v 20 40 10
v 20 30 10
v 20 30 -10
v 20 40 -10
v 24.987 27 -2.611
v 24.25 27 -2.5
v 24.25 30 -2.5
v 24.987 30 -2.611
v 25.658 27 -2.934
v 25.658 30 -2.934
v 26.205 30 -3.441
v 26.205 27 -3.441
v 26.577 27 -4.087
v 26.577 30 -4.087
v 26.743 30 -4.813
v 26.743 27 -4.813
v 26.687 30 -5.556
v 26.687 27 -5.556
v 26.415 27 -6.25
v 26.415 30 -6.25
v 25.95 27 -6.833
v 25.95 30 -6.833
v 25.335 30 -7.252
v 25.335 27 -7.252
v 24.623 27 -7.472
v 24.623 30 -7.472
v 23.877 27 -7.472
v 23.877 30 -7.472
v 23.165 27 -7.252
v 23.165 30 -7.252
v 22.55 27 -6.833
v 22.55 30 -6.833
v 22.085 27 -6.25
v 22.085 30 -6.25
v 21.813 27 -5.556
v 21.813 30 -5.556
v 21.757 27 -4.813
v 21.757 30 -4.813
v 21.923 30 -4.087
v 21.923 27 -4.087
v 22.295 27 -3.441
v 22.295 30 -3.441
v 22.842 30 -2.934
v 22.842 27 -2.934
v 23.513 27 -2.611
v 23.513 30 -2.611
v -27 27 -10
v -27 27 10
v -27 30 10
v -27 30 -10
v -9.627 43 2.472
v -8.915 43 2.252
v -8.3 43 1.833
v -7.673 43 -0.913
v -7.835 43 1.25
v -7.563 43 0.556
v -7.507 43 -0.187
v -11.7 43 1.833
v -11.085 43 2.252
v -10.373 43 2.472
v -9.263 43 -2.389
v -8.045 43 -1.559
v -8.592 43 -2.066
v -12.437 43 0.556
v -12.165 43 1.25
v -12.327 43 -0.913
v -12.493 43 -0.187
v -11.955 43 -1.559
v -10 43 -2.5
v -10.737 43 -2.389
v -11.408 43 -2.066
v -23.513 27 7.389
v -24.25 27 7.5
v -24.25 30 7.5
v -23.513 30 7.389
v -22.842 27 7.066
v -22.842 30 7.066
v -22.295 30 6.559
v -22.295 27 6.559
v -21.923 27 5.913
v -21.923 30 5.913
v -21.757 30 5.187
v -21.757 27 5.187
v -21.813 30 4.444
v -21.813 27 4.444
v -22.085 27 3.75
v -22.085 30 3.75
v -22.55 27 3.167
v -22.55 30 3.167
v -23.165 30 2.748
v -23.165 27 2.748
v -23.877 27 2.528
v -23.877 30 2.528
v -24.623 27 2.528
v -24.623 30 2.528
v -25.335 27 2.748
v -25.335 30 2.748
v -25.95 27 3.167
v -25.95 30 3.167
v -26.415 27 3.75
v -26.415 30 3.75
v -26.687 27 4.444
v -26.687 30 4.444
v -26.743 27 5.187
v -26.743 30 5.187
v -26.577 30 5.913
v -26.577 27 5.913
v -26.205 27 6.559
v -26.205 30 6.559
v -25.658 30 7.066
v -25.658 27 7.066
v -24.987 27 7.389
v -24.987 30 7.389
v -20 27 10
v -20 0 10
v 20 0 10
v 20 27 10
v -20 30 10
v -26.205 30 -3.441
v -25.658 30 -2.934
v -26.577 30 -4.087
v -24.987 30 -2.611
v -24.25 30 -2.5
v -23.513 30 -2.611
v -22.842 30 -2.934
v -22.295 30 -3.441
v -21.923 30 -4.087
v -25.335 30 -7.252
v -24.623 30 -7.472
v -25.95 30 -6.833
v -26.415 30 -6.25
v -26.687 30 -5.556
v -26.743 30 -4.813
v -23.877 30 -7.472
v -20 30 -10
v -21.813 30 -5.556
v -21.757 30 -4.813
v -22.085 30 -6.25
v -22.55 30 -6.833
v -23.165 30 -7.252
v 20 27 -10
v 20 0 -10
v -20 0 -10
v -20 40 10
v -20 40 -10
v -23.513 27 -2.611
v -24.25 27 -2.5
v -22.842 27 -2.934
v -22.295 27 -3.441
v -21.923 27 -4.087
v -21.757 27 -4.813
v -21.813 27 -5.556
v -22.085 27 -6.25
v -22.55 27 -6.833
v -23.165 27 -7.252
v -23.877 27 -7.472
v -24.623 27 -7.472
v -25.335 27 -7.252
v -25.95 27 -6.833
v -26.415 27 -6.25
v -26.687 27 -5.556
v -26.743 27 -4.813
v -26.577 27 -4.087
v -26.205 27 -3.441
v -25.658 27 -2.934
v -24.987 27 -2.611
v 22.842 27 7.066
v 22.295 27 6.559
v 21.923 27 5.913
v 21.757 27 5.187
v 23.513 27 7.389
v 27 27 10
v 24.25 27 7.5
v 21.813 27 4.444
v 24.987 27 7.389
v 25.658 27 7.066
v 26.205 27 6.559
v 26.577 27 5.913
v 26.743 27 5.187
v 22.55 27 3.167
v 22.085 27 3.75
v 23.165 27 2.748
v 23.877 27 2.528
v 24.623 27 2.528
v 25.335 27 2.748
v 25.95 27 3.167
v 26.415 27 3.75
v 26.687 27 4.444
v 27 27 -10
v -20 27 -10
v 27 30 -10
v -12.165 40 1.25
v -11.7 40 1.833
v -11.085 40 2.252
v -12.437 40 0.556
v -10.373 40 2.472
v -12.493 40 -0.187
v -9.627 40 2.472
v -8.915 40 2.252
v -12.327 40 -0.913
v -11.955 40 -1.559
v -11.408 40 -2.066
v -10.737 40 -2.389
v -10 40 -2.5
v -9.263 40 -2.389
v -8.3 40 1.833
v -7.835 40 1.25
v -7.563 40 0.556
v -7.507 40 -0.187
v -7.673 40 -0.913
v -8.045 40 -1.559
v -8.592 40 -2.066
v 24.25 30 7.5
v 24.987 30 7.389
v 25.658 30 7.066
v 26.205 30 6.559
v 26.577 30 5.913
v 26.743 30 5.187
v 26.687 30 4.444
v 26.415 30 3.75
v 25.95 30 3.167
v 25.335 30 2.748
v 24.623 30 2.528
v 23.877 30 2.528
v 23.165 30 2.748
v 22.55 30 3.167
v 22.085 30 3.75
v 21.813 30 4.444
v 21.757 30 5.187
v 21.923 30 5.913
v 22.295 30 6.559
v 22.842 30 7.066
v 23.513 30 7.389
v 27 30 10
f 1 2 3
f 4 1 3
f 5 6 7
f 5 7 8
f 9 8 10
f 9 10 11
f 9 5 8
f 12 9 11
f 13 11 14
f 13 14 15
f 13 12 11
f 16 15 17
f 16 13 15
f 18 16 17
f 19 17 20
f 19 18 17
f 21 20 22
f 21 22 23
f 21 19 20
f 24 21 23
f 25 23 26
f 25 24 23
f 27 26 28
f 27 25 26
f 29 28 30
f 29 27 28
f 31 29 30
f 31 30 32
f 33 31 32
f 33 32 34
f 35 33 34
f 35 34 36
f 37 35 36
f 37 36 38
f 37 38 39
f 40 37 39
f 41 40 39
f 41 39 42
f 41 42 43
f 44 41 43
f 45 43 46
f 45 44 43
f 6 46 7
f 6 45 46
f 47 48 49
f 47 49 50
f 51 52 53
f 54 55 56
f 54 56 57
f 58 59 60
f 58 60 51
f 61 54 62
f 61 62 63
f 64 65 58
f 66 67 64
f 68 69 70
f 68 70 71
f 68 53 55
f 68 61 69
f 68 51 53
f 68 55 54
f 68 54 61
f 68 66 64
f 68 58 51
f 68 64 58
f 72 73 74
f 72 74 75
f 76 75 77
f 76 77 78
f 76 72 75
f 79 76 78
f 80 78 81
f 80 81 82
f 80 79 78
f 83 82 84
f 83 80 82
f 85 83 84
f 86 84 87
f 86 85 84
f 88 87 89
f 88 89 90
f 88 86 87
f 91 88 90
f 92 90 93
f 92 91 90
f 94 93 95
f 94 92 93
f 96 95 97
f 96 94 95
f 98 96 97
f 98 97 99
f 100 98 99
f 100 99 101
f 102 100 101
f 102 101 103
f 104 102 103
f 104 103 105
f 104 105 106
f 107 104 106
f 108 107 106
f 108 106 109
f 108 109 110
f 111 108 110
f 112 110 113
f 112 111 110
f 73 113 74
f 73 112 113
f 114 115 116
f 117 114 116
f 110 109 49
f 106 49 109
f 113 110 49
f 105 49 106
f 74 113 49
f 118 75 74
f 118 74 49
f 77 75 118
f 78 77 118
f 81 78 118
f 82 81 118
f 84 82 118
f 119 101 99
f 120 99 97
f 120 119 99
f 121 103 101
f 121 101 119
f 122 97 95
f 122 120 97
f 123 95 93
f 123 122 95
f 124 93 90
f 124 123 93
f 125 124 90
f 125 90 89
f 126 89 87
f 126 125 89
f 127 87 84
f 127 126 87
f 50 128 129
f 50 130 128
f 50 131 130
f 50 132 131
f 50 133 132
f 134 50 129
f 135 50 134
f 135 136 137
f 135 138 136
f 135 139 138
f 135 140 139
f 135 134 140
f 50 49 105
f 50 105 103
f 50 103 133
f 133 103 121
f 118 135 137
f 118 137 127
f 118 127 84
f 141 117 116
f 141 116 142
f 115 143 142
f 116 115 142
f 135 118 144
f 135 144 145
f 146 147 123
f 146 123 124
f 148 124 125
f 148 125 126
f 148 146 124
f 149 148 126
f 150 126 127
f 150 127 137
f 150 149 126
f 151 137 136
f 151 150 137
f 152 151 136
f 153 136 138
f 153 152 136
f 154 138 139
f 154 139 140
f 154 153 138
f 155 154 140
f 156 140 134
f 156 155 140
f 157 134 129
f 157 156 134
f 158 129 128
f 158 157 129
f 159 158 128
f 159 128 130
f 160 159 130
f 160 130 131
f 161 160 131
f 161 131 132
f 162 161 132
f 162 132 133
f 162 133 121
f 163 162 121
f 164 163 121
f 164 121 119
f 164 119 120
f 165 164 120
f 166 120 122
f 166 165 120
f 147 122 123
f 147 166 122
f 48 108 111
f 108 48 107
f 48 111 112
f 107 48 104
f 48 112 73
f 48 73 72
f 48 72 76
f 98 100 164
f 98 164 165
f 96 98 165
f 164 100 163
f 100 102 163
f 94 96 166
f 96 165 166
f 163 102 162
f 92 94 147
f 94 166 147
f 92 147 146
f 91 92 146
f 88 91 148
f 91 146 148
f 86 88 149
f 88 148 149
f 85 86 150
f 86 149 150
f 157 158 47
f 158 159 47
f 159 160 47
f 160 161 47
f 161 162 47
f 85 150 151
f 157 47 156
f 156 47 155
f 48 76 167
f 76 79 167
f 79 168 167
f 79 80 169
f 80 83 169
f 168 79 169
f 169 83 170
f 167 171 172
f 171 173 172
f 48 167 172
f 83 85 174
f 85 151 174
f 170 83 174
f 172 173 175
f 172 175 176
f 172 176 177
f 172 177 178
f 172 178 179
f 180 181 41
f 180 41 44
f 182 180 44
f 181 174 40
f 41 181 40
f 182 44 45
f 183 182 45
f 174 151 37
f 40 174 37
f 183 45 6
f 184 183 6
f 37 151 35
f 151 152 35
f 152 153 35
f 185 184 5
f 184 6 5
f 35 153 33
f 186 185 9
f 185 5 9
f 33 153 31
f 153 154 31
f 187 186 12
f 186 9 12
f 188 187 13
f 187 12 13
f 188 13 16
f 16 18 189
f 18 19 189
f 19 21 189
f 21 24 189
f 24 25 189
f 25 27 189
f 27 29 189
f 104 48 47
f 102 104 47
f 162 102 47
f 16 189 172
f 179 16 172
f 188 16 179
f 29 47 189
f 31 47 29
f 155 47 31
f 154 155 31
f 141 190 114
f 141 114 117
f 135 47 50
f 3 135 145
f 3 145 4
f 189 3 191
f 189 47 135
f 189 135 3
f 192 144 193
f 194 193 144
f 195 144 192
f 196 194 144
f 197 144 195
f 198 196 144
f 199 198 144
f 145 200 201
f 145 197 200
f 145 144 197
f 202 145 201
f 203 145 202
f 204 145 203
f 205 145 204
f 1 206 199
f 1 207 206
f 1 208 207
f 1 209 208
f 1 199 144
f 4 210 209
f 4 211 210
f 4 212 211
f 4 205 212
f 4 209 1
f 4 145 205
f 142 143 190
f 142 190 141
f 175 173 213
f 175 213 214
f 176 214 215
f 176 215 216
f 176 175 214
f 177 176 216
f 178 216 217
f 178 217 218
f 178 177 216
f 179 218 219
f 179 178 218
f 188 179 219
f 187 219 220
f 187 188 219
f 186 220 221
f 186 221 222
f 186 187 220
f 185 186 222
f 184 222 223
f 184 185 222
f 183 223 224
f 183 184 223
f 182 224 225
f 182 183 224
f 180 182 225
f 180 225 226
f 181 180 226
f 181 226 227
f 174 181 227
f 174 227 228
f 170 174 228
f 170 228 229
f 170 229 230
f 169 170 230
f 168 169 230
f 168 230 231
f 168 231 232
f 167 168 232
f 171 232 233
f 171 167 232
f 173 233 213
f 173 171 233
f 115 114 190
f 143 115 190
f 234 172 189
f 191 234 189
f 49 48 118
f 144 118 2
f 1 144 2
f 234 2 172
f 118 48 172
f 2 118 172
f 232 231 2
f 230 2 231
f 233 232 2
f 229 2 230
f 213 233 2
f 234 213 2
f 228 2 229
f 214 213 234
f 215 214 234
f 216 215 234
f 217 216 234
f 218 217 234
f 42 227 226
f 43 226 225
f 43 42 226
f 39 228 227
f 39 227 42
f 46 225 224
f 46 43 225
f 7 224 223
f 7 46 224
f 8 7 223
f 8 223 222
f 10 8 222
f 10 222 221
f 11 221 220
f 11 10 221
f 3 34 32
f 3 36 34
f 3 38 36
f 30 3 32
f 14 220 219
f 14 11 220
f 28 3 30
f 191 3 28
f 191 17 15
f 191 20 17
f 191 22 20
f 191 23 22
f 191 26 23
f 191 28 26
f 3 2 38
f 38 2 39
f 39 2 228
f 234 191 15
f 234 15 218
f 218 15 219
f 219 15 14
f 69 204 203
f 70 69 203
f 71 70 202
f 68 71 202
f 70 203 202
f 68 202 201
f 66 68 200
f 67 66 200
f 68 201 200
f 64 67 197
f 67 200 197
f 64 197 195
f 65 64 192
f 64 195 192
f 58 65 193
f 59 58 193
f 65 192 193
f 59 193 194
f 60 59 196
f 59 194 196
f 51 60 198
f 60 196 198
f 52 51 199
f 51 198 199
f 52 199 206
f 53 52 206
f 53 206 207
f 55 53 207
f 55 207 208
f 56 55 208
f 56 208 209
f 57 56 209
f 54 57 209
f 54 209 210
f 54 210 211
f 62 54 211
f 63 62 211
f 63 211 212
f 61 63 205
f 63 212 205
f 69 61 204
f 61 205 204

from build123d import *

# Parameters (mm, degrees)
SKETCH1_W           = 40
SKETCH1_H           = 20
BOSS_EXTRUDE1_DEPTH = 27
SKETCH2_W           = 54
SKETCH2_H           = 20
SKETCH2_R           = 2.5
BOSS_EXTRUDE4_DEPTH = 3
SKETCH3_W           = 40
SKETCH3_H           = 20
BOSS_EXTRUDE5_DEPTH = 10
SKETCH5_R           = 2.5
BOSS_EXTRUDE6_DEPTH = 3


with BuildPart() as part:
    # Sketch1 → Boss-Extrude1 (new body)
    with BuildSketch(Plane(origin=(0, 0, 0), x_dir=(1, 0, 0), z_dir=(0, 1, 0))):
        Rectangle(SKETCH1_W, SKETCH1_H)
    extrude(amount=BOSS_EXTRUDE1_DEPTH)


with BuildPart() as body_2:
    # Sketch2 → Boss-Extrude4 (new body)
    with BuildSketch(Plane(origin=(0, 27, 0), x_dir=(1, 0, 0), z_dir=(0, 1, 0))):
        Rectangle(SKETCH2_W, SKETCH2_H)
        with Locations(Location((-24.25, 5, 0), (0, 0, 270))):
            Circle(SKETCH2_R, mode=Mode.SUBTRACT)
        with Locations(Location((-24.25, -5, 0), (0, 0, 270))):
            Circle(SKETCH2_R, mode=Mode.SUBTRACT)
        with Locations(Location((24.25, -5, 0), (0, 0, 270))):
            Circle(SKETCH2_R, mode=Mode.SUBTRACT)
        with Locations(Location((24.25, 5, 0), (0, 0, 270))):
            Circle(SKETCH2_R, mode=Mode.SUBTRACT)
    extrude(amount=BOSS_EXTRUDE4_DEPTH)

    # Sketch3 → Boss-Extrude5 (add)
    with BuildSketch(Plane(origin=(0, 30, 0), x_dir=(1, 0, 0), z_dir=(0, 1, 0))):
        Rectangle(SKETCH3_W, SKETCH3_H)
    extrude(amount=BOSS_EXTRUDE5_DEPTH)

    # Sketch5 → Boss-Extrude6 (add)
    with BuildSketch(Plane(origin=(0, 40, 0), x_dir=(1, 0, 0), z_dir=(0, 1, 0))):
        with Locations(Location((-10, 0, 0), (0, 0, 90))):
            Circle(SKETCH5_R)
    extrude(amount=BOSS_EXTRUDE6_DEPTH)


solid = Compound([part.part, body_2.part])
